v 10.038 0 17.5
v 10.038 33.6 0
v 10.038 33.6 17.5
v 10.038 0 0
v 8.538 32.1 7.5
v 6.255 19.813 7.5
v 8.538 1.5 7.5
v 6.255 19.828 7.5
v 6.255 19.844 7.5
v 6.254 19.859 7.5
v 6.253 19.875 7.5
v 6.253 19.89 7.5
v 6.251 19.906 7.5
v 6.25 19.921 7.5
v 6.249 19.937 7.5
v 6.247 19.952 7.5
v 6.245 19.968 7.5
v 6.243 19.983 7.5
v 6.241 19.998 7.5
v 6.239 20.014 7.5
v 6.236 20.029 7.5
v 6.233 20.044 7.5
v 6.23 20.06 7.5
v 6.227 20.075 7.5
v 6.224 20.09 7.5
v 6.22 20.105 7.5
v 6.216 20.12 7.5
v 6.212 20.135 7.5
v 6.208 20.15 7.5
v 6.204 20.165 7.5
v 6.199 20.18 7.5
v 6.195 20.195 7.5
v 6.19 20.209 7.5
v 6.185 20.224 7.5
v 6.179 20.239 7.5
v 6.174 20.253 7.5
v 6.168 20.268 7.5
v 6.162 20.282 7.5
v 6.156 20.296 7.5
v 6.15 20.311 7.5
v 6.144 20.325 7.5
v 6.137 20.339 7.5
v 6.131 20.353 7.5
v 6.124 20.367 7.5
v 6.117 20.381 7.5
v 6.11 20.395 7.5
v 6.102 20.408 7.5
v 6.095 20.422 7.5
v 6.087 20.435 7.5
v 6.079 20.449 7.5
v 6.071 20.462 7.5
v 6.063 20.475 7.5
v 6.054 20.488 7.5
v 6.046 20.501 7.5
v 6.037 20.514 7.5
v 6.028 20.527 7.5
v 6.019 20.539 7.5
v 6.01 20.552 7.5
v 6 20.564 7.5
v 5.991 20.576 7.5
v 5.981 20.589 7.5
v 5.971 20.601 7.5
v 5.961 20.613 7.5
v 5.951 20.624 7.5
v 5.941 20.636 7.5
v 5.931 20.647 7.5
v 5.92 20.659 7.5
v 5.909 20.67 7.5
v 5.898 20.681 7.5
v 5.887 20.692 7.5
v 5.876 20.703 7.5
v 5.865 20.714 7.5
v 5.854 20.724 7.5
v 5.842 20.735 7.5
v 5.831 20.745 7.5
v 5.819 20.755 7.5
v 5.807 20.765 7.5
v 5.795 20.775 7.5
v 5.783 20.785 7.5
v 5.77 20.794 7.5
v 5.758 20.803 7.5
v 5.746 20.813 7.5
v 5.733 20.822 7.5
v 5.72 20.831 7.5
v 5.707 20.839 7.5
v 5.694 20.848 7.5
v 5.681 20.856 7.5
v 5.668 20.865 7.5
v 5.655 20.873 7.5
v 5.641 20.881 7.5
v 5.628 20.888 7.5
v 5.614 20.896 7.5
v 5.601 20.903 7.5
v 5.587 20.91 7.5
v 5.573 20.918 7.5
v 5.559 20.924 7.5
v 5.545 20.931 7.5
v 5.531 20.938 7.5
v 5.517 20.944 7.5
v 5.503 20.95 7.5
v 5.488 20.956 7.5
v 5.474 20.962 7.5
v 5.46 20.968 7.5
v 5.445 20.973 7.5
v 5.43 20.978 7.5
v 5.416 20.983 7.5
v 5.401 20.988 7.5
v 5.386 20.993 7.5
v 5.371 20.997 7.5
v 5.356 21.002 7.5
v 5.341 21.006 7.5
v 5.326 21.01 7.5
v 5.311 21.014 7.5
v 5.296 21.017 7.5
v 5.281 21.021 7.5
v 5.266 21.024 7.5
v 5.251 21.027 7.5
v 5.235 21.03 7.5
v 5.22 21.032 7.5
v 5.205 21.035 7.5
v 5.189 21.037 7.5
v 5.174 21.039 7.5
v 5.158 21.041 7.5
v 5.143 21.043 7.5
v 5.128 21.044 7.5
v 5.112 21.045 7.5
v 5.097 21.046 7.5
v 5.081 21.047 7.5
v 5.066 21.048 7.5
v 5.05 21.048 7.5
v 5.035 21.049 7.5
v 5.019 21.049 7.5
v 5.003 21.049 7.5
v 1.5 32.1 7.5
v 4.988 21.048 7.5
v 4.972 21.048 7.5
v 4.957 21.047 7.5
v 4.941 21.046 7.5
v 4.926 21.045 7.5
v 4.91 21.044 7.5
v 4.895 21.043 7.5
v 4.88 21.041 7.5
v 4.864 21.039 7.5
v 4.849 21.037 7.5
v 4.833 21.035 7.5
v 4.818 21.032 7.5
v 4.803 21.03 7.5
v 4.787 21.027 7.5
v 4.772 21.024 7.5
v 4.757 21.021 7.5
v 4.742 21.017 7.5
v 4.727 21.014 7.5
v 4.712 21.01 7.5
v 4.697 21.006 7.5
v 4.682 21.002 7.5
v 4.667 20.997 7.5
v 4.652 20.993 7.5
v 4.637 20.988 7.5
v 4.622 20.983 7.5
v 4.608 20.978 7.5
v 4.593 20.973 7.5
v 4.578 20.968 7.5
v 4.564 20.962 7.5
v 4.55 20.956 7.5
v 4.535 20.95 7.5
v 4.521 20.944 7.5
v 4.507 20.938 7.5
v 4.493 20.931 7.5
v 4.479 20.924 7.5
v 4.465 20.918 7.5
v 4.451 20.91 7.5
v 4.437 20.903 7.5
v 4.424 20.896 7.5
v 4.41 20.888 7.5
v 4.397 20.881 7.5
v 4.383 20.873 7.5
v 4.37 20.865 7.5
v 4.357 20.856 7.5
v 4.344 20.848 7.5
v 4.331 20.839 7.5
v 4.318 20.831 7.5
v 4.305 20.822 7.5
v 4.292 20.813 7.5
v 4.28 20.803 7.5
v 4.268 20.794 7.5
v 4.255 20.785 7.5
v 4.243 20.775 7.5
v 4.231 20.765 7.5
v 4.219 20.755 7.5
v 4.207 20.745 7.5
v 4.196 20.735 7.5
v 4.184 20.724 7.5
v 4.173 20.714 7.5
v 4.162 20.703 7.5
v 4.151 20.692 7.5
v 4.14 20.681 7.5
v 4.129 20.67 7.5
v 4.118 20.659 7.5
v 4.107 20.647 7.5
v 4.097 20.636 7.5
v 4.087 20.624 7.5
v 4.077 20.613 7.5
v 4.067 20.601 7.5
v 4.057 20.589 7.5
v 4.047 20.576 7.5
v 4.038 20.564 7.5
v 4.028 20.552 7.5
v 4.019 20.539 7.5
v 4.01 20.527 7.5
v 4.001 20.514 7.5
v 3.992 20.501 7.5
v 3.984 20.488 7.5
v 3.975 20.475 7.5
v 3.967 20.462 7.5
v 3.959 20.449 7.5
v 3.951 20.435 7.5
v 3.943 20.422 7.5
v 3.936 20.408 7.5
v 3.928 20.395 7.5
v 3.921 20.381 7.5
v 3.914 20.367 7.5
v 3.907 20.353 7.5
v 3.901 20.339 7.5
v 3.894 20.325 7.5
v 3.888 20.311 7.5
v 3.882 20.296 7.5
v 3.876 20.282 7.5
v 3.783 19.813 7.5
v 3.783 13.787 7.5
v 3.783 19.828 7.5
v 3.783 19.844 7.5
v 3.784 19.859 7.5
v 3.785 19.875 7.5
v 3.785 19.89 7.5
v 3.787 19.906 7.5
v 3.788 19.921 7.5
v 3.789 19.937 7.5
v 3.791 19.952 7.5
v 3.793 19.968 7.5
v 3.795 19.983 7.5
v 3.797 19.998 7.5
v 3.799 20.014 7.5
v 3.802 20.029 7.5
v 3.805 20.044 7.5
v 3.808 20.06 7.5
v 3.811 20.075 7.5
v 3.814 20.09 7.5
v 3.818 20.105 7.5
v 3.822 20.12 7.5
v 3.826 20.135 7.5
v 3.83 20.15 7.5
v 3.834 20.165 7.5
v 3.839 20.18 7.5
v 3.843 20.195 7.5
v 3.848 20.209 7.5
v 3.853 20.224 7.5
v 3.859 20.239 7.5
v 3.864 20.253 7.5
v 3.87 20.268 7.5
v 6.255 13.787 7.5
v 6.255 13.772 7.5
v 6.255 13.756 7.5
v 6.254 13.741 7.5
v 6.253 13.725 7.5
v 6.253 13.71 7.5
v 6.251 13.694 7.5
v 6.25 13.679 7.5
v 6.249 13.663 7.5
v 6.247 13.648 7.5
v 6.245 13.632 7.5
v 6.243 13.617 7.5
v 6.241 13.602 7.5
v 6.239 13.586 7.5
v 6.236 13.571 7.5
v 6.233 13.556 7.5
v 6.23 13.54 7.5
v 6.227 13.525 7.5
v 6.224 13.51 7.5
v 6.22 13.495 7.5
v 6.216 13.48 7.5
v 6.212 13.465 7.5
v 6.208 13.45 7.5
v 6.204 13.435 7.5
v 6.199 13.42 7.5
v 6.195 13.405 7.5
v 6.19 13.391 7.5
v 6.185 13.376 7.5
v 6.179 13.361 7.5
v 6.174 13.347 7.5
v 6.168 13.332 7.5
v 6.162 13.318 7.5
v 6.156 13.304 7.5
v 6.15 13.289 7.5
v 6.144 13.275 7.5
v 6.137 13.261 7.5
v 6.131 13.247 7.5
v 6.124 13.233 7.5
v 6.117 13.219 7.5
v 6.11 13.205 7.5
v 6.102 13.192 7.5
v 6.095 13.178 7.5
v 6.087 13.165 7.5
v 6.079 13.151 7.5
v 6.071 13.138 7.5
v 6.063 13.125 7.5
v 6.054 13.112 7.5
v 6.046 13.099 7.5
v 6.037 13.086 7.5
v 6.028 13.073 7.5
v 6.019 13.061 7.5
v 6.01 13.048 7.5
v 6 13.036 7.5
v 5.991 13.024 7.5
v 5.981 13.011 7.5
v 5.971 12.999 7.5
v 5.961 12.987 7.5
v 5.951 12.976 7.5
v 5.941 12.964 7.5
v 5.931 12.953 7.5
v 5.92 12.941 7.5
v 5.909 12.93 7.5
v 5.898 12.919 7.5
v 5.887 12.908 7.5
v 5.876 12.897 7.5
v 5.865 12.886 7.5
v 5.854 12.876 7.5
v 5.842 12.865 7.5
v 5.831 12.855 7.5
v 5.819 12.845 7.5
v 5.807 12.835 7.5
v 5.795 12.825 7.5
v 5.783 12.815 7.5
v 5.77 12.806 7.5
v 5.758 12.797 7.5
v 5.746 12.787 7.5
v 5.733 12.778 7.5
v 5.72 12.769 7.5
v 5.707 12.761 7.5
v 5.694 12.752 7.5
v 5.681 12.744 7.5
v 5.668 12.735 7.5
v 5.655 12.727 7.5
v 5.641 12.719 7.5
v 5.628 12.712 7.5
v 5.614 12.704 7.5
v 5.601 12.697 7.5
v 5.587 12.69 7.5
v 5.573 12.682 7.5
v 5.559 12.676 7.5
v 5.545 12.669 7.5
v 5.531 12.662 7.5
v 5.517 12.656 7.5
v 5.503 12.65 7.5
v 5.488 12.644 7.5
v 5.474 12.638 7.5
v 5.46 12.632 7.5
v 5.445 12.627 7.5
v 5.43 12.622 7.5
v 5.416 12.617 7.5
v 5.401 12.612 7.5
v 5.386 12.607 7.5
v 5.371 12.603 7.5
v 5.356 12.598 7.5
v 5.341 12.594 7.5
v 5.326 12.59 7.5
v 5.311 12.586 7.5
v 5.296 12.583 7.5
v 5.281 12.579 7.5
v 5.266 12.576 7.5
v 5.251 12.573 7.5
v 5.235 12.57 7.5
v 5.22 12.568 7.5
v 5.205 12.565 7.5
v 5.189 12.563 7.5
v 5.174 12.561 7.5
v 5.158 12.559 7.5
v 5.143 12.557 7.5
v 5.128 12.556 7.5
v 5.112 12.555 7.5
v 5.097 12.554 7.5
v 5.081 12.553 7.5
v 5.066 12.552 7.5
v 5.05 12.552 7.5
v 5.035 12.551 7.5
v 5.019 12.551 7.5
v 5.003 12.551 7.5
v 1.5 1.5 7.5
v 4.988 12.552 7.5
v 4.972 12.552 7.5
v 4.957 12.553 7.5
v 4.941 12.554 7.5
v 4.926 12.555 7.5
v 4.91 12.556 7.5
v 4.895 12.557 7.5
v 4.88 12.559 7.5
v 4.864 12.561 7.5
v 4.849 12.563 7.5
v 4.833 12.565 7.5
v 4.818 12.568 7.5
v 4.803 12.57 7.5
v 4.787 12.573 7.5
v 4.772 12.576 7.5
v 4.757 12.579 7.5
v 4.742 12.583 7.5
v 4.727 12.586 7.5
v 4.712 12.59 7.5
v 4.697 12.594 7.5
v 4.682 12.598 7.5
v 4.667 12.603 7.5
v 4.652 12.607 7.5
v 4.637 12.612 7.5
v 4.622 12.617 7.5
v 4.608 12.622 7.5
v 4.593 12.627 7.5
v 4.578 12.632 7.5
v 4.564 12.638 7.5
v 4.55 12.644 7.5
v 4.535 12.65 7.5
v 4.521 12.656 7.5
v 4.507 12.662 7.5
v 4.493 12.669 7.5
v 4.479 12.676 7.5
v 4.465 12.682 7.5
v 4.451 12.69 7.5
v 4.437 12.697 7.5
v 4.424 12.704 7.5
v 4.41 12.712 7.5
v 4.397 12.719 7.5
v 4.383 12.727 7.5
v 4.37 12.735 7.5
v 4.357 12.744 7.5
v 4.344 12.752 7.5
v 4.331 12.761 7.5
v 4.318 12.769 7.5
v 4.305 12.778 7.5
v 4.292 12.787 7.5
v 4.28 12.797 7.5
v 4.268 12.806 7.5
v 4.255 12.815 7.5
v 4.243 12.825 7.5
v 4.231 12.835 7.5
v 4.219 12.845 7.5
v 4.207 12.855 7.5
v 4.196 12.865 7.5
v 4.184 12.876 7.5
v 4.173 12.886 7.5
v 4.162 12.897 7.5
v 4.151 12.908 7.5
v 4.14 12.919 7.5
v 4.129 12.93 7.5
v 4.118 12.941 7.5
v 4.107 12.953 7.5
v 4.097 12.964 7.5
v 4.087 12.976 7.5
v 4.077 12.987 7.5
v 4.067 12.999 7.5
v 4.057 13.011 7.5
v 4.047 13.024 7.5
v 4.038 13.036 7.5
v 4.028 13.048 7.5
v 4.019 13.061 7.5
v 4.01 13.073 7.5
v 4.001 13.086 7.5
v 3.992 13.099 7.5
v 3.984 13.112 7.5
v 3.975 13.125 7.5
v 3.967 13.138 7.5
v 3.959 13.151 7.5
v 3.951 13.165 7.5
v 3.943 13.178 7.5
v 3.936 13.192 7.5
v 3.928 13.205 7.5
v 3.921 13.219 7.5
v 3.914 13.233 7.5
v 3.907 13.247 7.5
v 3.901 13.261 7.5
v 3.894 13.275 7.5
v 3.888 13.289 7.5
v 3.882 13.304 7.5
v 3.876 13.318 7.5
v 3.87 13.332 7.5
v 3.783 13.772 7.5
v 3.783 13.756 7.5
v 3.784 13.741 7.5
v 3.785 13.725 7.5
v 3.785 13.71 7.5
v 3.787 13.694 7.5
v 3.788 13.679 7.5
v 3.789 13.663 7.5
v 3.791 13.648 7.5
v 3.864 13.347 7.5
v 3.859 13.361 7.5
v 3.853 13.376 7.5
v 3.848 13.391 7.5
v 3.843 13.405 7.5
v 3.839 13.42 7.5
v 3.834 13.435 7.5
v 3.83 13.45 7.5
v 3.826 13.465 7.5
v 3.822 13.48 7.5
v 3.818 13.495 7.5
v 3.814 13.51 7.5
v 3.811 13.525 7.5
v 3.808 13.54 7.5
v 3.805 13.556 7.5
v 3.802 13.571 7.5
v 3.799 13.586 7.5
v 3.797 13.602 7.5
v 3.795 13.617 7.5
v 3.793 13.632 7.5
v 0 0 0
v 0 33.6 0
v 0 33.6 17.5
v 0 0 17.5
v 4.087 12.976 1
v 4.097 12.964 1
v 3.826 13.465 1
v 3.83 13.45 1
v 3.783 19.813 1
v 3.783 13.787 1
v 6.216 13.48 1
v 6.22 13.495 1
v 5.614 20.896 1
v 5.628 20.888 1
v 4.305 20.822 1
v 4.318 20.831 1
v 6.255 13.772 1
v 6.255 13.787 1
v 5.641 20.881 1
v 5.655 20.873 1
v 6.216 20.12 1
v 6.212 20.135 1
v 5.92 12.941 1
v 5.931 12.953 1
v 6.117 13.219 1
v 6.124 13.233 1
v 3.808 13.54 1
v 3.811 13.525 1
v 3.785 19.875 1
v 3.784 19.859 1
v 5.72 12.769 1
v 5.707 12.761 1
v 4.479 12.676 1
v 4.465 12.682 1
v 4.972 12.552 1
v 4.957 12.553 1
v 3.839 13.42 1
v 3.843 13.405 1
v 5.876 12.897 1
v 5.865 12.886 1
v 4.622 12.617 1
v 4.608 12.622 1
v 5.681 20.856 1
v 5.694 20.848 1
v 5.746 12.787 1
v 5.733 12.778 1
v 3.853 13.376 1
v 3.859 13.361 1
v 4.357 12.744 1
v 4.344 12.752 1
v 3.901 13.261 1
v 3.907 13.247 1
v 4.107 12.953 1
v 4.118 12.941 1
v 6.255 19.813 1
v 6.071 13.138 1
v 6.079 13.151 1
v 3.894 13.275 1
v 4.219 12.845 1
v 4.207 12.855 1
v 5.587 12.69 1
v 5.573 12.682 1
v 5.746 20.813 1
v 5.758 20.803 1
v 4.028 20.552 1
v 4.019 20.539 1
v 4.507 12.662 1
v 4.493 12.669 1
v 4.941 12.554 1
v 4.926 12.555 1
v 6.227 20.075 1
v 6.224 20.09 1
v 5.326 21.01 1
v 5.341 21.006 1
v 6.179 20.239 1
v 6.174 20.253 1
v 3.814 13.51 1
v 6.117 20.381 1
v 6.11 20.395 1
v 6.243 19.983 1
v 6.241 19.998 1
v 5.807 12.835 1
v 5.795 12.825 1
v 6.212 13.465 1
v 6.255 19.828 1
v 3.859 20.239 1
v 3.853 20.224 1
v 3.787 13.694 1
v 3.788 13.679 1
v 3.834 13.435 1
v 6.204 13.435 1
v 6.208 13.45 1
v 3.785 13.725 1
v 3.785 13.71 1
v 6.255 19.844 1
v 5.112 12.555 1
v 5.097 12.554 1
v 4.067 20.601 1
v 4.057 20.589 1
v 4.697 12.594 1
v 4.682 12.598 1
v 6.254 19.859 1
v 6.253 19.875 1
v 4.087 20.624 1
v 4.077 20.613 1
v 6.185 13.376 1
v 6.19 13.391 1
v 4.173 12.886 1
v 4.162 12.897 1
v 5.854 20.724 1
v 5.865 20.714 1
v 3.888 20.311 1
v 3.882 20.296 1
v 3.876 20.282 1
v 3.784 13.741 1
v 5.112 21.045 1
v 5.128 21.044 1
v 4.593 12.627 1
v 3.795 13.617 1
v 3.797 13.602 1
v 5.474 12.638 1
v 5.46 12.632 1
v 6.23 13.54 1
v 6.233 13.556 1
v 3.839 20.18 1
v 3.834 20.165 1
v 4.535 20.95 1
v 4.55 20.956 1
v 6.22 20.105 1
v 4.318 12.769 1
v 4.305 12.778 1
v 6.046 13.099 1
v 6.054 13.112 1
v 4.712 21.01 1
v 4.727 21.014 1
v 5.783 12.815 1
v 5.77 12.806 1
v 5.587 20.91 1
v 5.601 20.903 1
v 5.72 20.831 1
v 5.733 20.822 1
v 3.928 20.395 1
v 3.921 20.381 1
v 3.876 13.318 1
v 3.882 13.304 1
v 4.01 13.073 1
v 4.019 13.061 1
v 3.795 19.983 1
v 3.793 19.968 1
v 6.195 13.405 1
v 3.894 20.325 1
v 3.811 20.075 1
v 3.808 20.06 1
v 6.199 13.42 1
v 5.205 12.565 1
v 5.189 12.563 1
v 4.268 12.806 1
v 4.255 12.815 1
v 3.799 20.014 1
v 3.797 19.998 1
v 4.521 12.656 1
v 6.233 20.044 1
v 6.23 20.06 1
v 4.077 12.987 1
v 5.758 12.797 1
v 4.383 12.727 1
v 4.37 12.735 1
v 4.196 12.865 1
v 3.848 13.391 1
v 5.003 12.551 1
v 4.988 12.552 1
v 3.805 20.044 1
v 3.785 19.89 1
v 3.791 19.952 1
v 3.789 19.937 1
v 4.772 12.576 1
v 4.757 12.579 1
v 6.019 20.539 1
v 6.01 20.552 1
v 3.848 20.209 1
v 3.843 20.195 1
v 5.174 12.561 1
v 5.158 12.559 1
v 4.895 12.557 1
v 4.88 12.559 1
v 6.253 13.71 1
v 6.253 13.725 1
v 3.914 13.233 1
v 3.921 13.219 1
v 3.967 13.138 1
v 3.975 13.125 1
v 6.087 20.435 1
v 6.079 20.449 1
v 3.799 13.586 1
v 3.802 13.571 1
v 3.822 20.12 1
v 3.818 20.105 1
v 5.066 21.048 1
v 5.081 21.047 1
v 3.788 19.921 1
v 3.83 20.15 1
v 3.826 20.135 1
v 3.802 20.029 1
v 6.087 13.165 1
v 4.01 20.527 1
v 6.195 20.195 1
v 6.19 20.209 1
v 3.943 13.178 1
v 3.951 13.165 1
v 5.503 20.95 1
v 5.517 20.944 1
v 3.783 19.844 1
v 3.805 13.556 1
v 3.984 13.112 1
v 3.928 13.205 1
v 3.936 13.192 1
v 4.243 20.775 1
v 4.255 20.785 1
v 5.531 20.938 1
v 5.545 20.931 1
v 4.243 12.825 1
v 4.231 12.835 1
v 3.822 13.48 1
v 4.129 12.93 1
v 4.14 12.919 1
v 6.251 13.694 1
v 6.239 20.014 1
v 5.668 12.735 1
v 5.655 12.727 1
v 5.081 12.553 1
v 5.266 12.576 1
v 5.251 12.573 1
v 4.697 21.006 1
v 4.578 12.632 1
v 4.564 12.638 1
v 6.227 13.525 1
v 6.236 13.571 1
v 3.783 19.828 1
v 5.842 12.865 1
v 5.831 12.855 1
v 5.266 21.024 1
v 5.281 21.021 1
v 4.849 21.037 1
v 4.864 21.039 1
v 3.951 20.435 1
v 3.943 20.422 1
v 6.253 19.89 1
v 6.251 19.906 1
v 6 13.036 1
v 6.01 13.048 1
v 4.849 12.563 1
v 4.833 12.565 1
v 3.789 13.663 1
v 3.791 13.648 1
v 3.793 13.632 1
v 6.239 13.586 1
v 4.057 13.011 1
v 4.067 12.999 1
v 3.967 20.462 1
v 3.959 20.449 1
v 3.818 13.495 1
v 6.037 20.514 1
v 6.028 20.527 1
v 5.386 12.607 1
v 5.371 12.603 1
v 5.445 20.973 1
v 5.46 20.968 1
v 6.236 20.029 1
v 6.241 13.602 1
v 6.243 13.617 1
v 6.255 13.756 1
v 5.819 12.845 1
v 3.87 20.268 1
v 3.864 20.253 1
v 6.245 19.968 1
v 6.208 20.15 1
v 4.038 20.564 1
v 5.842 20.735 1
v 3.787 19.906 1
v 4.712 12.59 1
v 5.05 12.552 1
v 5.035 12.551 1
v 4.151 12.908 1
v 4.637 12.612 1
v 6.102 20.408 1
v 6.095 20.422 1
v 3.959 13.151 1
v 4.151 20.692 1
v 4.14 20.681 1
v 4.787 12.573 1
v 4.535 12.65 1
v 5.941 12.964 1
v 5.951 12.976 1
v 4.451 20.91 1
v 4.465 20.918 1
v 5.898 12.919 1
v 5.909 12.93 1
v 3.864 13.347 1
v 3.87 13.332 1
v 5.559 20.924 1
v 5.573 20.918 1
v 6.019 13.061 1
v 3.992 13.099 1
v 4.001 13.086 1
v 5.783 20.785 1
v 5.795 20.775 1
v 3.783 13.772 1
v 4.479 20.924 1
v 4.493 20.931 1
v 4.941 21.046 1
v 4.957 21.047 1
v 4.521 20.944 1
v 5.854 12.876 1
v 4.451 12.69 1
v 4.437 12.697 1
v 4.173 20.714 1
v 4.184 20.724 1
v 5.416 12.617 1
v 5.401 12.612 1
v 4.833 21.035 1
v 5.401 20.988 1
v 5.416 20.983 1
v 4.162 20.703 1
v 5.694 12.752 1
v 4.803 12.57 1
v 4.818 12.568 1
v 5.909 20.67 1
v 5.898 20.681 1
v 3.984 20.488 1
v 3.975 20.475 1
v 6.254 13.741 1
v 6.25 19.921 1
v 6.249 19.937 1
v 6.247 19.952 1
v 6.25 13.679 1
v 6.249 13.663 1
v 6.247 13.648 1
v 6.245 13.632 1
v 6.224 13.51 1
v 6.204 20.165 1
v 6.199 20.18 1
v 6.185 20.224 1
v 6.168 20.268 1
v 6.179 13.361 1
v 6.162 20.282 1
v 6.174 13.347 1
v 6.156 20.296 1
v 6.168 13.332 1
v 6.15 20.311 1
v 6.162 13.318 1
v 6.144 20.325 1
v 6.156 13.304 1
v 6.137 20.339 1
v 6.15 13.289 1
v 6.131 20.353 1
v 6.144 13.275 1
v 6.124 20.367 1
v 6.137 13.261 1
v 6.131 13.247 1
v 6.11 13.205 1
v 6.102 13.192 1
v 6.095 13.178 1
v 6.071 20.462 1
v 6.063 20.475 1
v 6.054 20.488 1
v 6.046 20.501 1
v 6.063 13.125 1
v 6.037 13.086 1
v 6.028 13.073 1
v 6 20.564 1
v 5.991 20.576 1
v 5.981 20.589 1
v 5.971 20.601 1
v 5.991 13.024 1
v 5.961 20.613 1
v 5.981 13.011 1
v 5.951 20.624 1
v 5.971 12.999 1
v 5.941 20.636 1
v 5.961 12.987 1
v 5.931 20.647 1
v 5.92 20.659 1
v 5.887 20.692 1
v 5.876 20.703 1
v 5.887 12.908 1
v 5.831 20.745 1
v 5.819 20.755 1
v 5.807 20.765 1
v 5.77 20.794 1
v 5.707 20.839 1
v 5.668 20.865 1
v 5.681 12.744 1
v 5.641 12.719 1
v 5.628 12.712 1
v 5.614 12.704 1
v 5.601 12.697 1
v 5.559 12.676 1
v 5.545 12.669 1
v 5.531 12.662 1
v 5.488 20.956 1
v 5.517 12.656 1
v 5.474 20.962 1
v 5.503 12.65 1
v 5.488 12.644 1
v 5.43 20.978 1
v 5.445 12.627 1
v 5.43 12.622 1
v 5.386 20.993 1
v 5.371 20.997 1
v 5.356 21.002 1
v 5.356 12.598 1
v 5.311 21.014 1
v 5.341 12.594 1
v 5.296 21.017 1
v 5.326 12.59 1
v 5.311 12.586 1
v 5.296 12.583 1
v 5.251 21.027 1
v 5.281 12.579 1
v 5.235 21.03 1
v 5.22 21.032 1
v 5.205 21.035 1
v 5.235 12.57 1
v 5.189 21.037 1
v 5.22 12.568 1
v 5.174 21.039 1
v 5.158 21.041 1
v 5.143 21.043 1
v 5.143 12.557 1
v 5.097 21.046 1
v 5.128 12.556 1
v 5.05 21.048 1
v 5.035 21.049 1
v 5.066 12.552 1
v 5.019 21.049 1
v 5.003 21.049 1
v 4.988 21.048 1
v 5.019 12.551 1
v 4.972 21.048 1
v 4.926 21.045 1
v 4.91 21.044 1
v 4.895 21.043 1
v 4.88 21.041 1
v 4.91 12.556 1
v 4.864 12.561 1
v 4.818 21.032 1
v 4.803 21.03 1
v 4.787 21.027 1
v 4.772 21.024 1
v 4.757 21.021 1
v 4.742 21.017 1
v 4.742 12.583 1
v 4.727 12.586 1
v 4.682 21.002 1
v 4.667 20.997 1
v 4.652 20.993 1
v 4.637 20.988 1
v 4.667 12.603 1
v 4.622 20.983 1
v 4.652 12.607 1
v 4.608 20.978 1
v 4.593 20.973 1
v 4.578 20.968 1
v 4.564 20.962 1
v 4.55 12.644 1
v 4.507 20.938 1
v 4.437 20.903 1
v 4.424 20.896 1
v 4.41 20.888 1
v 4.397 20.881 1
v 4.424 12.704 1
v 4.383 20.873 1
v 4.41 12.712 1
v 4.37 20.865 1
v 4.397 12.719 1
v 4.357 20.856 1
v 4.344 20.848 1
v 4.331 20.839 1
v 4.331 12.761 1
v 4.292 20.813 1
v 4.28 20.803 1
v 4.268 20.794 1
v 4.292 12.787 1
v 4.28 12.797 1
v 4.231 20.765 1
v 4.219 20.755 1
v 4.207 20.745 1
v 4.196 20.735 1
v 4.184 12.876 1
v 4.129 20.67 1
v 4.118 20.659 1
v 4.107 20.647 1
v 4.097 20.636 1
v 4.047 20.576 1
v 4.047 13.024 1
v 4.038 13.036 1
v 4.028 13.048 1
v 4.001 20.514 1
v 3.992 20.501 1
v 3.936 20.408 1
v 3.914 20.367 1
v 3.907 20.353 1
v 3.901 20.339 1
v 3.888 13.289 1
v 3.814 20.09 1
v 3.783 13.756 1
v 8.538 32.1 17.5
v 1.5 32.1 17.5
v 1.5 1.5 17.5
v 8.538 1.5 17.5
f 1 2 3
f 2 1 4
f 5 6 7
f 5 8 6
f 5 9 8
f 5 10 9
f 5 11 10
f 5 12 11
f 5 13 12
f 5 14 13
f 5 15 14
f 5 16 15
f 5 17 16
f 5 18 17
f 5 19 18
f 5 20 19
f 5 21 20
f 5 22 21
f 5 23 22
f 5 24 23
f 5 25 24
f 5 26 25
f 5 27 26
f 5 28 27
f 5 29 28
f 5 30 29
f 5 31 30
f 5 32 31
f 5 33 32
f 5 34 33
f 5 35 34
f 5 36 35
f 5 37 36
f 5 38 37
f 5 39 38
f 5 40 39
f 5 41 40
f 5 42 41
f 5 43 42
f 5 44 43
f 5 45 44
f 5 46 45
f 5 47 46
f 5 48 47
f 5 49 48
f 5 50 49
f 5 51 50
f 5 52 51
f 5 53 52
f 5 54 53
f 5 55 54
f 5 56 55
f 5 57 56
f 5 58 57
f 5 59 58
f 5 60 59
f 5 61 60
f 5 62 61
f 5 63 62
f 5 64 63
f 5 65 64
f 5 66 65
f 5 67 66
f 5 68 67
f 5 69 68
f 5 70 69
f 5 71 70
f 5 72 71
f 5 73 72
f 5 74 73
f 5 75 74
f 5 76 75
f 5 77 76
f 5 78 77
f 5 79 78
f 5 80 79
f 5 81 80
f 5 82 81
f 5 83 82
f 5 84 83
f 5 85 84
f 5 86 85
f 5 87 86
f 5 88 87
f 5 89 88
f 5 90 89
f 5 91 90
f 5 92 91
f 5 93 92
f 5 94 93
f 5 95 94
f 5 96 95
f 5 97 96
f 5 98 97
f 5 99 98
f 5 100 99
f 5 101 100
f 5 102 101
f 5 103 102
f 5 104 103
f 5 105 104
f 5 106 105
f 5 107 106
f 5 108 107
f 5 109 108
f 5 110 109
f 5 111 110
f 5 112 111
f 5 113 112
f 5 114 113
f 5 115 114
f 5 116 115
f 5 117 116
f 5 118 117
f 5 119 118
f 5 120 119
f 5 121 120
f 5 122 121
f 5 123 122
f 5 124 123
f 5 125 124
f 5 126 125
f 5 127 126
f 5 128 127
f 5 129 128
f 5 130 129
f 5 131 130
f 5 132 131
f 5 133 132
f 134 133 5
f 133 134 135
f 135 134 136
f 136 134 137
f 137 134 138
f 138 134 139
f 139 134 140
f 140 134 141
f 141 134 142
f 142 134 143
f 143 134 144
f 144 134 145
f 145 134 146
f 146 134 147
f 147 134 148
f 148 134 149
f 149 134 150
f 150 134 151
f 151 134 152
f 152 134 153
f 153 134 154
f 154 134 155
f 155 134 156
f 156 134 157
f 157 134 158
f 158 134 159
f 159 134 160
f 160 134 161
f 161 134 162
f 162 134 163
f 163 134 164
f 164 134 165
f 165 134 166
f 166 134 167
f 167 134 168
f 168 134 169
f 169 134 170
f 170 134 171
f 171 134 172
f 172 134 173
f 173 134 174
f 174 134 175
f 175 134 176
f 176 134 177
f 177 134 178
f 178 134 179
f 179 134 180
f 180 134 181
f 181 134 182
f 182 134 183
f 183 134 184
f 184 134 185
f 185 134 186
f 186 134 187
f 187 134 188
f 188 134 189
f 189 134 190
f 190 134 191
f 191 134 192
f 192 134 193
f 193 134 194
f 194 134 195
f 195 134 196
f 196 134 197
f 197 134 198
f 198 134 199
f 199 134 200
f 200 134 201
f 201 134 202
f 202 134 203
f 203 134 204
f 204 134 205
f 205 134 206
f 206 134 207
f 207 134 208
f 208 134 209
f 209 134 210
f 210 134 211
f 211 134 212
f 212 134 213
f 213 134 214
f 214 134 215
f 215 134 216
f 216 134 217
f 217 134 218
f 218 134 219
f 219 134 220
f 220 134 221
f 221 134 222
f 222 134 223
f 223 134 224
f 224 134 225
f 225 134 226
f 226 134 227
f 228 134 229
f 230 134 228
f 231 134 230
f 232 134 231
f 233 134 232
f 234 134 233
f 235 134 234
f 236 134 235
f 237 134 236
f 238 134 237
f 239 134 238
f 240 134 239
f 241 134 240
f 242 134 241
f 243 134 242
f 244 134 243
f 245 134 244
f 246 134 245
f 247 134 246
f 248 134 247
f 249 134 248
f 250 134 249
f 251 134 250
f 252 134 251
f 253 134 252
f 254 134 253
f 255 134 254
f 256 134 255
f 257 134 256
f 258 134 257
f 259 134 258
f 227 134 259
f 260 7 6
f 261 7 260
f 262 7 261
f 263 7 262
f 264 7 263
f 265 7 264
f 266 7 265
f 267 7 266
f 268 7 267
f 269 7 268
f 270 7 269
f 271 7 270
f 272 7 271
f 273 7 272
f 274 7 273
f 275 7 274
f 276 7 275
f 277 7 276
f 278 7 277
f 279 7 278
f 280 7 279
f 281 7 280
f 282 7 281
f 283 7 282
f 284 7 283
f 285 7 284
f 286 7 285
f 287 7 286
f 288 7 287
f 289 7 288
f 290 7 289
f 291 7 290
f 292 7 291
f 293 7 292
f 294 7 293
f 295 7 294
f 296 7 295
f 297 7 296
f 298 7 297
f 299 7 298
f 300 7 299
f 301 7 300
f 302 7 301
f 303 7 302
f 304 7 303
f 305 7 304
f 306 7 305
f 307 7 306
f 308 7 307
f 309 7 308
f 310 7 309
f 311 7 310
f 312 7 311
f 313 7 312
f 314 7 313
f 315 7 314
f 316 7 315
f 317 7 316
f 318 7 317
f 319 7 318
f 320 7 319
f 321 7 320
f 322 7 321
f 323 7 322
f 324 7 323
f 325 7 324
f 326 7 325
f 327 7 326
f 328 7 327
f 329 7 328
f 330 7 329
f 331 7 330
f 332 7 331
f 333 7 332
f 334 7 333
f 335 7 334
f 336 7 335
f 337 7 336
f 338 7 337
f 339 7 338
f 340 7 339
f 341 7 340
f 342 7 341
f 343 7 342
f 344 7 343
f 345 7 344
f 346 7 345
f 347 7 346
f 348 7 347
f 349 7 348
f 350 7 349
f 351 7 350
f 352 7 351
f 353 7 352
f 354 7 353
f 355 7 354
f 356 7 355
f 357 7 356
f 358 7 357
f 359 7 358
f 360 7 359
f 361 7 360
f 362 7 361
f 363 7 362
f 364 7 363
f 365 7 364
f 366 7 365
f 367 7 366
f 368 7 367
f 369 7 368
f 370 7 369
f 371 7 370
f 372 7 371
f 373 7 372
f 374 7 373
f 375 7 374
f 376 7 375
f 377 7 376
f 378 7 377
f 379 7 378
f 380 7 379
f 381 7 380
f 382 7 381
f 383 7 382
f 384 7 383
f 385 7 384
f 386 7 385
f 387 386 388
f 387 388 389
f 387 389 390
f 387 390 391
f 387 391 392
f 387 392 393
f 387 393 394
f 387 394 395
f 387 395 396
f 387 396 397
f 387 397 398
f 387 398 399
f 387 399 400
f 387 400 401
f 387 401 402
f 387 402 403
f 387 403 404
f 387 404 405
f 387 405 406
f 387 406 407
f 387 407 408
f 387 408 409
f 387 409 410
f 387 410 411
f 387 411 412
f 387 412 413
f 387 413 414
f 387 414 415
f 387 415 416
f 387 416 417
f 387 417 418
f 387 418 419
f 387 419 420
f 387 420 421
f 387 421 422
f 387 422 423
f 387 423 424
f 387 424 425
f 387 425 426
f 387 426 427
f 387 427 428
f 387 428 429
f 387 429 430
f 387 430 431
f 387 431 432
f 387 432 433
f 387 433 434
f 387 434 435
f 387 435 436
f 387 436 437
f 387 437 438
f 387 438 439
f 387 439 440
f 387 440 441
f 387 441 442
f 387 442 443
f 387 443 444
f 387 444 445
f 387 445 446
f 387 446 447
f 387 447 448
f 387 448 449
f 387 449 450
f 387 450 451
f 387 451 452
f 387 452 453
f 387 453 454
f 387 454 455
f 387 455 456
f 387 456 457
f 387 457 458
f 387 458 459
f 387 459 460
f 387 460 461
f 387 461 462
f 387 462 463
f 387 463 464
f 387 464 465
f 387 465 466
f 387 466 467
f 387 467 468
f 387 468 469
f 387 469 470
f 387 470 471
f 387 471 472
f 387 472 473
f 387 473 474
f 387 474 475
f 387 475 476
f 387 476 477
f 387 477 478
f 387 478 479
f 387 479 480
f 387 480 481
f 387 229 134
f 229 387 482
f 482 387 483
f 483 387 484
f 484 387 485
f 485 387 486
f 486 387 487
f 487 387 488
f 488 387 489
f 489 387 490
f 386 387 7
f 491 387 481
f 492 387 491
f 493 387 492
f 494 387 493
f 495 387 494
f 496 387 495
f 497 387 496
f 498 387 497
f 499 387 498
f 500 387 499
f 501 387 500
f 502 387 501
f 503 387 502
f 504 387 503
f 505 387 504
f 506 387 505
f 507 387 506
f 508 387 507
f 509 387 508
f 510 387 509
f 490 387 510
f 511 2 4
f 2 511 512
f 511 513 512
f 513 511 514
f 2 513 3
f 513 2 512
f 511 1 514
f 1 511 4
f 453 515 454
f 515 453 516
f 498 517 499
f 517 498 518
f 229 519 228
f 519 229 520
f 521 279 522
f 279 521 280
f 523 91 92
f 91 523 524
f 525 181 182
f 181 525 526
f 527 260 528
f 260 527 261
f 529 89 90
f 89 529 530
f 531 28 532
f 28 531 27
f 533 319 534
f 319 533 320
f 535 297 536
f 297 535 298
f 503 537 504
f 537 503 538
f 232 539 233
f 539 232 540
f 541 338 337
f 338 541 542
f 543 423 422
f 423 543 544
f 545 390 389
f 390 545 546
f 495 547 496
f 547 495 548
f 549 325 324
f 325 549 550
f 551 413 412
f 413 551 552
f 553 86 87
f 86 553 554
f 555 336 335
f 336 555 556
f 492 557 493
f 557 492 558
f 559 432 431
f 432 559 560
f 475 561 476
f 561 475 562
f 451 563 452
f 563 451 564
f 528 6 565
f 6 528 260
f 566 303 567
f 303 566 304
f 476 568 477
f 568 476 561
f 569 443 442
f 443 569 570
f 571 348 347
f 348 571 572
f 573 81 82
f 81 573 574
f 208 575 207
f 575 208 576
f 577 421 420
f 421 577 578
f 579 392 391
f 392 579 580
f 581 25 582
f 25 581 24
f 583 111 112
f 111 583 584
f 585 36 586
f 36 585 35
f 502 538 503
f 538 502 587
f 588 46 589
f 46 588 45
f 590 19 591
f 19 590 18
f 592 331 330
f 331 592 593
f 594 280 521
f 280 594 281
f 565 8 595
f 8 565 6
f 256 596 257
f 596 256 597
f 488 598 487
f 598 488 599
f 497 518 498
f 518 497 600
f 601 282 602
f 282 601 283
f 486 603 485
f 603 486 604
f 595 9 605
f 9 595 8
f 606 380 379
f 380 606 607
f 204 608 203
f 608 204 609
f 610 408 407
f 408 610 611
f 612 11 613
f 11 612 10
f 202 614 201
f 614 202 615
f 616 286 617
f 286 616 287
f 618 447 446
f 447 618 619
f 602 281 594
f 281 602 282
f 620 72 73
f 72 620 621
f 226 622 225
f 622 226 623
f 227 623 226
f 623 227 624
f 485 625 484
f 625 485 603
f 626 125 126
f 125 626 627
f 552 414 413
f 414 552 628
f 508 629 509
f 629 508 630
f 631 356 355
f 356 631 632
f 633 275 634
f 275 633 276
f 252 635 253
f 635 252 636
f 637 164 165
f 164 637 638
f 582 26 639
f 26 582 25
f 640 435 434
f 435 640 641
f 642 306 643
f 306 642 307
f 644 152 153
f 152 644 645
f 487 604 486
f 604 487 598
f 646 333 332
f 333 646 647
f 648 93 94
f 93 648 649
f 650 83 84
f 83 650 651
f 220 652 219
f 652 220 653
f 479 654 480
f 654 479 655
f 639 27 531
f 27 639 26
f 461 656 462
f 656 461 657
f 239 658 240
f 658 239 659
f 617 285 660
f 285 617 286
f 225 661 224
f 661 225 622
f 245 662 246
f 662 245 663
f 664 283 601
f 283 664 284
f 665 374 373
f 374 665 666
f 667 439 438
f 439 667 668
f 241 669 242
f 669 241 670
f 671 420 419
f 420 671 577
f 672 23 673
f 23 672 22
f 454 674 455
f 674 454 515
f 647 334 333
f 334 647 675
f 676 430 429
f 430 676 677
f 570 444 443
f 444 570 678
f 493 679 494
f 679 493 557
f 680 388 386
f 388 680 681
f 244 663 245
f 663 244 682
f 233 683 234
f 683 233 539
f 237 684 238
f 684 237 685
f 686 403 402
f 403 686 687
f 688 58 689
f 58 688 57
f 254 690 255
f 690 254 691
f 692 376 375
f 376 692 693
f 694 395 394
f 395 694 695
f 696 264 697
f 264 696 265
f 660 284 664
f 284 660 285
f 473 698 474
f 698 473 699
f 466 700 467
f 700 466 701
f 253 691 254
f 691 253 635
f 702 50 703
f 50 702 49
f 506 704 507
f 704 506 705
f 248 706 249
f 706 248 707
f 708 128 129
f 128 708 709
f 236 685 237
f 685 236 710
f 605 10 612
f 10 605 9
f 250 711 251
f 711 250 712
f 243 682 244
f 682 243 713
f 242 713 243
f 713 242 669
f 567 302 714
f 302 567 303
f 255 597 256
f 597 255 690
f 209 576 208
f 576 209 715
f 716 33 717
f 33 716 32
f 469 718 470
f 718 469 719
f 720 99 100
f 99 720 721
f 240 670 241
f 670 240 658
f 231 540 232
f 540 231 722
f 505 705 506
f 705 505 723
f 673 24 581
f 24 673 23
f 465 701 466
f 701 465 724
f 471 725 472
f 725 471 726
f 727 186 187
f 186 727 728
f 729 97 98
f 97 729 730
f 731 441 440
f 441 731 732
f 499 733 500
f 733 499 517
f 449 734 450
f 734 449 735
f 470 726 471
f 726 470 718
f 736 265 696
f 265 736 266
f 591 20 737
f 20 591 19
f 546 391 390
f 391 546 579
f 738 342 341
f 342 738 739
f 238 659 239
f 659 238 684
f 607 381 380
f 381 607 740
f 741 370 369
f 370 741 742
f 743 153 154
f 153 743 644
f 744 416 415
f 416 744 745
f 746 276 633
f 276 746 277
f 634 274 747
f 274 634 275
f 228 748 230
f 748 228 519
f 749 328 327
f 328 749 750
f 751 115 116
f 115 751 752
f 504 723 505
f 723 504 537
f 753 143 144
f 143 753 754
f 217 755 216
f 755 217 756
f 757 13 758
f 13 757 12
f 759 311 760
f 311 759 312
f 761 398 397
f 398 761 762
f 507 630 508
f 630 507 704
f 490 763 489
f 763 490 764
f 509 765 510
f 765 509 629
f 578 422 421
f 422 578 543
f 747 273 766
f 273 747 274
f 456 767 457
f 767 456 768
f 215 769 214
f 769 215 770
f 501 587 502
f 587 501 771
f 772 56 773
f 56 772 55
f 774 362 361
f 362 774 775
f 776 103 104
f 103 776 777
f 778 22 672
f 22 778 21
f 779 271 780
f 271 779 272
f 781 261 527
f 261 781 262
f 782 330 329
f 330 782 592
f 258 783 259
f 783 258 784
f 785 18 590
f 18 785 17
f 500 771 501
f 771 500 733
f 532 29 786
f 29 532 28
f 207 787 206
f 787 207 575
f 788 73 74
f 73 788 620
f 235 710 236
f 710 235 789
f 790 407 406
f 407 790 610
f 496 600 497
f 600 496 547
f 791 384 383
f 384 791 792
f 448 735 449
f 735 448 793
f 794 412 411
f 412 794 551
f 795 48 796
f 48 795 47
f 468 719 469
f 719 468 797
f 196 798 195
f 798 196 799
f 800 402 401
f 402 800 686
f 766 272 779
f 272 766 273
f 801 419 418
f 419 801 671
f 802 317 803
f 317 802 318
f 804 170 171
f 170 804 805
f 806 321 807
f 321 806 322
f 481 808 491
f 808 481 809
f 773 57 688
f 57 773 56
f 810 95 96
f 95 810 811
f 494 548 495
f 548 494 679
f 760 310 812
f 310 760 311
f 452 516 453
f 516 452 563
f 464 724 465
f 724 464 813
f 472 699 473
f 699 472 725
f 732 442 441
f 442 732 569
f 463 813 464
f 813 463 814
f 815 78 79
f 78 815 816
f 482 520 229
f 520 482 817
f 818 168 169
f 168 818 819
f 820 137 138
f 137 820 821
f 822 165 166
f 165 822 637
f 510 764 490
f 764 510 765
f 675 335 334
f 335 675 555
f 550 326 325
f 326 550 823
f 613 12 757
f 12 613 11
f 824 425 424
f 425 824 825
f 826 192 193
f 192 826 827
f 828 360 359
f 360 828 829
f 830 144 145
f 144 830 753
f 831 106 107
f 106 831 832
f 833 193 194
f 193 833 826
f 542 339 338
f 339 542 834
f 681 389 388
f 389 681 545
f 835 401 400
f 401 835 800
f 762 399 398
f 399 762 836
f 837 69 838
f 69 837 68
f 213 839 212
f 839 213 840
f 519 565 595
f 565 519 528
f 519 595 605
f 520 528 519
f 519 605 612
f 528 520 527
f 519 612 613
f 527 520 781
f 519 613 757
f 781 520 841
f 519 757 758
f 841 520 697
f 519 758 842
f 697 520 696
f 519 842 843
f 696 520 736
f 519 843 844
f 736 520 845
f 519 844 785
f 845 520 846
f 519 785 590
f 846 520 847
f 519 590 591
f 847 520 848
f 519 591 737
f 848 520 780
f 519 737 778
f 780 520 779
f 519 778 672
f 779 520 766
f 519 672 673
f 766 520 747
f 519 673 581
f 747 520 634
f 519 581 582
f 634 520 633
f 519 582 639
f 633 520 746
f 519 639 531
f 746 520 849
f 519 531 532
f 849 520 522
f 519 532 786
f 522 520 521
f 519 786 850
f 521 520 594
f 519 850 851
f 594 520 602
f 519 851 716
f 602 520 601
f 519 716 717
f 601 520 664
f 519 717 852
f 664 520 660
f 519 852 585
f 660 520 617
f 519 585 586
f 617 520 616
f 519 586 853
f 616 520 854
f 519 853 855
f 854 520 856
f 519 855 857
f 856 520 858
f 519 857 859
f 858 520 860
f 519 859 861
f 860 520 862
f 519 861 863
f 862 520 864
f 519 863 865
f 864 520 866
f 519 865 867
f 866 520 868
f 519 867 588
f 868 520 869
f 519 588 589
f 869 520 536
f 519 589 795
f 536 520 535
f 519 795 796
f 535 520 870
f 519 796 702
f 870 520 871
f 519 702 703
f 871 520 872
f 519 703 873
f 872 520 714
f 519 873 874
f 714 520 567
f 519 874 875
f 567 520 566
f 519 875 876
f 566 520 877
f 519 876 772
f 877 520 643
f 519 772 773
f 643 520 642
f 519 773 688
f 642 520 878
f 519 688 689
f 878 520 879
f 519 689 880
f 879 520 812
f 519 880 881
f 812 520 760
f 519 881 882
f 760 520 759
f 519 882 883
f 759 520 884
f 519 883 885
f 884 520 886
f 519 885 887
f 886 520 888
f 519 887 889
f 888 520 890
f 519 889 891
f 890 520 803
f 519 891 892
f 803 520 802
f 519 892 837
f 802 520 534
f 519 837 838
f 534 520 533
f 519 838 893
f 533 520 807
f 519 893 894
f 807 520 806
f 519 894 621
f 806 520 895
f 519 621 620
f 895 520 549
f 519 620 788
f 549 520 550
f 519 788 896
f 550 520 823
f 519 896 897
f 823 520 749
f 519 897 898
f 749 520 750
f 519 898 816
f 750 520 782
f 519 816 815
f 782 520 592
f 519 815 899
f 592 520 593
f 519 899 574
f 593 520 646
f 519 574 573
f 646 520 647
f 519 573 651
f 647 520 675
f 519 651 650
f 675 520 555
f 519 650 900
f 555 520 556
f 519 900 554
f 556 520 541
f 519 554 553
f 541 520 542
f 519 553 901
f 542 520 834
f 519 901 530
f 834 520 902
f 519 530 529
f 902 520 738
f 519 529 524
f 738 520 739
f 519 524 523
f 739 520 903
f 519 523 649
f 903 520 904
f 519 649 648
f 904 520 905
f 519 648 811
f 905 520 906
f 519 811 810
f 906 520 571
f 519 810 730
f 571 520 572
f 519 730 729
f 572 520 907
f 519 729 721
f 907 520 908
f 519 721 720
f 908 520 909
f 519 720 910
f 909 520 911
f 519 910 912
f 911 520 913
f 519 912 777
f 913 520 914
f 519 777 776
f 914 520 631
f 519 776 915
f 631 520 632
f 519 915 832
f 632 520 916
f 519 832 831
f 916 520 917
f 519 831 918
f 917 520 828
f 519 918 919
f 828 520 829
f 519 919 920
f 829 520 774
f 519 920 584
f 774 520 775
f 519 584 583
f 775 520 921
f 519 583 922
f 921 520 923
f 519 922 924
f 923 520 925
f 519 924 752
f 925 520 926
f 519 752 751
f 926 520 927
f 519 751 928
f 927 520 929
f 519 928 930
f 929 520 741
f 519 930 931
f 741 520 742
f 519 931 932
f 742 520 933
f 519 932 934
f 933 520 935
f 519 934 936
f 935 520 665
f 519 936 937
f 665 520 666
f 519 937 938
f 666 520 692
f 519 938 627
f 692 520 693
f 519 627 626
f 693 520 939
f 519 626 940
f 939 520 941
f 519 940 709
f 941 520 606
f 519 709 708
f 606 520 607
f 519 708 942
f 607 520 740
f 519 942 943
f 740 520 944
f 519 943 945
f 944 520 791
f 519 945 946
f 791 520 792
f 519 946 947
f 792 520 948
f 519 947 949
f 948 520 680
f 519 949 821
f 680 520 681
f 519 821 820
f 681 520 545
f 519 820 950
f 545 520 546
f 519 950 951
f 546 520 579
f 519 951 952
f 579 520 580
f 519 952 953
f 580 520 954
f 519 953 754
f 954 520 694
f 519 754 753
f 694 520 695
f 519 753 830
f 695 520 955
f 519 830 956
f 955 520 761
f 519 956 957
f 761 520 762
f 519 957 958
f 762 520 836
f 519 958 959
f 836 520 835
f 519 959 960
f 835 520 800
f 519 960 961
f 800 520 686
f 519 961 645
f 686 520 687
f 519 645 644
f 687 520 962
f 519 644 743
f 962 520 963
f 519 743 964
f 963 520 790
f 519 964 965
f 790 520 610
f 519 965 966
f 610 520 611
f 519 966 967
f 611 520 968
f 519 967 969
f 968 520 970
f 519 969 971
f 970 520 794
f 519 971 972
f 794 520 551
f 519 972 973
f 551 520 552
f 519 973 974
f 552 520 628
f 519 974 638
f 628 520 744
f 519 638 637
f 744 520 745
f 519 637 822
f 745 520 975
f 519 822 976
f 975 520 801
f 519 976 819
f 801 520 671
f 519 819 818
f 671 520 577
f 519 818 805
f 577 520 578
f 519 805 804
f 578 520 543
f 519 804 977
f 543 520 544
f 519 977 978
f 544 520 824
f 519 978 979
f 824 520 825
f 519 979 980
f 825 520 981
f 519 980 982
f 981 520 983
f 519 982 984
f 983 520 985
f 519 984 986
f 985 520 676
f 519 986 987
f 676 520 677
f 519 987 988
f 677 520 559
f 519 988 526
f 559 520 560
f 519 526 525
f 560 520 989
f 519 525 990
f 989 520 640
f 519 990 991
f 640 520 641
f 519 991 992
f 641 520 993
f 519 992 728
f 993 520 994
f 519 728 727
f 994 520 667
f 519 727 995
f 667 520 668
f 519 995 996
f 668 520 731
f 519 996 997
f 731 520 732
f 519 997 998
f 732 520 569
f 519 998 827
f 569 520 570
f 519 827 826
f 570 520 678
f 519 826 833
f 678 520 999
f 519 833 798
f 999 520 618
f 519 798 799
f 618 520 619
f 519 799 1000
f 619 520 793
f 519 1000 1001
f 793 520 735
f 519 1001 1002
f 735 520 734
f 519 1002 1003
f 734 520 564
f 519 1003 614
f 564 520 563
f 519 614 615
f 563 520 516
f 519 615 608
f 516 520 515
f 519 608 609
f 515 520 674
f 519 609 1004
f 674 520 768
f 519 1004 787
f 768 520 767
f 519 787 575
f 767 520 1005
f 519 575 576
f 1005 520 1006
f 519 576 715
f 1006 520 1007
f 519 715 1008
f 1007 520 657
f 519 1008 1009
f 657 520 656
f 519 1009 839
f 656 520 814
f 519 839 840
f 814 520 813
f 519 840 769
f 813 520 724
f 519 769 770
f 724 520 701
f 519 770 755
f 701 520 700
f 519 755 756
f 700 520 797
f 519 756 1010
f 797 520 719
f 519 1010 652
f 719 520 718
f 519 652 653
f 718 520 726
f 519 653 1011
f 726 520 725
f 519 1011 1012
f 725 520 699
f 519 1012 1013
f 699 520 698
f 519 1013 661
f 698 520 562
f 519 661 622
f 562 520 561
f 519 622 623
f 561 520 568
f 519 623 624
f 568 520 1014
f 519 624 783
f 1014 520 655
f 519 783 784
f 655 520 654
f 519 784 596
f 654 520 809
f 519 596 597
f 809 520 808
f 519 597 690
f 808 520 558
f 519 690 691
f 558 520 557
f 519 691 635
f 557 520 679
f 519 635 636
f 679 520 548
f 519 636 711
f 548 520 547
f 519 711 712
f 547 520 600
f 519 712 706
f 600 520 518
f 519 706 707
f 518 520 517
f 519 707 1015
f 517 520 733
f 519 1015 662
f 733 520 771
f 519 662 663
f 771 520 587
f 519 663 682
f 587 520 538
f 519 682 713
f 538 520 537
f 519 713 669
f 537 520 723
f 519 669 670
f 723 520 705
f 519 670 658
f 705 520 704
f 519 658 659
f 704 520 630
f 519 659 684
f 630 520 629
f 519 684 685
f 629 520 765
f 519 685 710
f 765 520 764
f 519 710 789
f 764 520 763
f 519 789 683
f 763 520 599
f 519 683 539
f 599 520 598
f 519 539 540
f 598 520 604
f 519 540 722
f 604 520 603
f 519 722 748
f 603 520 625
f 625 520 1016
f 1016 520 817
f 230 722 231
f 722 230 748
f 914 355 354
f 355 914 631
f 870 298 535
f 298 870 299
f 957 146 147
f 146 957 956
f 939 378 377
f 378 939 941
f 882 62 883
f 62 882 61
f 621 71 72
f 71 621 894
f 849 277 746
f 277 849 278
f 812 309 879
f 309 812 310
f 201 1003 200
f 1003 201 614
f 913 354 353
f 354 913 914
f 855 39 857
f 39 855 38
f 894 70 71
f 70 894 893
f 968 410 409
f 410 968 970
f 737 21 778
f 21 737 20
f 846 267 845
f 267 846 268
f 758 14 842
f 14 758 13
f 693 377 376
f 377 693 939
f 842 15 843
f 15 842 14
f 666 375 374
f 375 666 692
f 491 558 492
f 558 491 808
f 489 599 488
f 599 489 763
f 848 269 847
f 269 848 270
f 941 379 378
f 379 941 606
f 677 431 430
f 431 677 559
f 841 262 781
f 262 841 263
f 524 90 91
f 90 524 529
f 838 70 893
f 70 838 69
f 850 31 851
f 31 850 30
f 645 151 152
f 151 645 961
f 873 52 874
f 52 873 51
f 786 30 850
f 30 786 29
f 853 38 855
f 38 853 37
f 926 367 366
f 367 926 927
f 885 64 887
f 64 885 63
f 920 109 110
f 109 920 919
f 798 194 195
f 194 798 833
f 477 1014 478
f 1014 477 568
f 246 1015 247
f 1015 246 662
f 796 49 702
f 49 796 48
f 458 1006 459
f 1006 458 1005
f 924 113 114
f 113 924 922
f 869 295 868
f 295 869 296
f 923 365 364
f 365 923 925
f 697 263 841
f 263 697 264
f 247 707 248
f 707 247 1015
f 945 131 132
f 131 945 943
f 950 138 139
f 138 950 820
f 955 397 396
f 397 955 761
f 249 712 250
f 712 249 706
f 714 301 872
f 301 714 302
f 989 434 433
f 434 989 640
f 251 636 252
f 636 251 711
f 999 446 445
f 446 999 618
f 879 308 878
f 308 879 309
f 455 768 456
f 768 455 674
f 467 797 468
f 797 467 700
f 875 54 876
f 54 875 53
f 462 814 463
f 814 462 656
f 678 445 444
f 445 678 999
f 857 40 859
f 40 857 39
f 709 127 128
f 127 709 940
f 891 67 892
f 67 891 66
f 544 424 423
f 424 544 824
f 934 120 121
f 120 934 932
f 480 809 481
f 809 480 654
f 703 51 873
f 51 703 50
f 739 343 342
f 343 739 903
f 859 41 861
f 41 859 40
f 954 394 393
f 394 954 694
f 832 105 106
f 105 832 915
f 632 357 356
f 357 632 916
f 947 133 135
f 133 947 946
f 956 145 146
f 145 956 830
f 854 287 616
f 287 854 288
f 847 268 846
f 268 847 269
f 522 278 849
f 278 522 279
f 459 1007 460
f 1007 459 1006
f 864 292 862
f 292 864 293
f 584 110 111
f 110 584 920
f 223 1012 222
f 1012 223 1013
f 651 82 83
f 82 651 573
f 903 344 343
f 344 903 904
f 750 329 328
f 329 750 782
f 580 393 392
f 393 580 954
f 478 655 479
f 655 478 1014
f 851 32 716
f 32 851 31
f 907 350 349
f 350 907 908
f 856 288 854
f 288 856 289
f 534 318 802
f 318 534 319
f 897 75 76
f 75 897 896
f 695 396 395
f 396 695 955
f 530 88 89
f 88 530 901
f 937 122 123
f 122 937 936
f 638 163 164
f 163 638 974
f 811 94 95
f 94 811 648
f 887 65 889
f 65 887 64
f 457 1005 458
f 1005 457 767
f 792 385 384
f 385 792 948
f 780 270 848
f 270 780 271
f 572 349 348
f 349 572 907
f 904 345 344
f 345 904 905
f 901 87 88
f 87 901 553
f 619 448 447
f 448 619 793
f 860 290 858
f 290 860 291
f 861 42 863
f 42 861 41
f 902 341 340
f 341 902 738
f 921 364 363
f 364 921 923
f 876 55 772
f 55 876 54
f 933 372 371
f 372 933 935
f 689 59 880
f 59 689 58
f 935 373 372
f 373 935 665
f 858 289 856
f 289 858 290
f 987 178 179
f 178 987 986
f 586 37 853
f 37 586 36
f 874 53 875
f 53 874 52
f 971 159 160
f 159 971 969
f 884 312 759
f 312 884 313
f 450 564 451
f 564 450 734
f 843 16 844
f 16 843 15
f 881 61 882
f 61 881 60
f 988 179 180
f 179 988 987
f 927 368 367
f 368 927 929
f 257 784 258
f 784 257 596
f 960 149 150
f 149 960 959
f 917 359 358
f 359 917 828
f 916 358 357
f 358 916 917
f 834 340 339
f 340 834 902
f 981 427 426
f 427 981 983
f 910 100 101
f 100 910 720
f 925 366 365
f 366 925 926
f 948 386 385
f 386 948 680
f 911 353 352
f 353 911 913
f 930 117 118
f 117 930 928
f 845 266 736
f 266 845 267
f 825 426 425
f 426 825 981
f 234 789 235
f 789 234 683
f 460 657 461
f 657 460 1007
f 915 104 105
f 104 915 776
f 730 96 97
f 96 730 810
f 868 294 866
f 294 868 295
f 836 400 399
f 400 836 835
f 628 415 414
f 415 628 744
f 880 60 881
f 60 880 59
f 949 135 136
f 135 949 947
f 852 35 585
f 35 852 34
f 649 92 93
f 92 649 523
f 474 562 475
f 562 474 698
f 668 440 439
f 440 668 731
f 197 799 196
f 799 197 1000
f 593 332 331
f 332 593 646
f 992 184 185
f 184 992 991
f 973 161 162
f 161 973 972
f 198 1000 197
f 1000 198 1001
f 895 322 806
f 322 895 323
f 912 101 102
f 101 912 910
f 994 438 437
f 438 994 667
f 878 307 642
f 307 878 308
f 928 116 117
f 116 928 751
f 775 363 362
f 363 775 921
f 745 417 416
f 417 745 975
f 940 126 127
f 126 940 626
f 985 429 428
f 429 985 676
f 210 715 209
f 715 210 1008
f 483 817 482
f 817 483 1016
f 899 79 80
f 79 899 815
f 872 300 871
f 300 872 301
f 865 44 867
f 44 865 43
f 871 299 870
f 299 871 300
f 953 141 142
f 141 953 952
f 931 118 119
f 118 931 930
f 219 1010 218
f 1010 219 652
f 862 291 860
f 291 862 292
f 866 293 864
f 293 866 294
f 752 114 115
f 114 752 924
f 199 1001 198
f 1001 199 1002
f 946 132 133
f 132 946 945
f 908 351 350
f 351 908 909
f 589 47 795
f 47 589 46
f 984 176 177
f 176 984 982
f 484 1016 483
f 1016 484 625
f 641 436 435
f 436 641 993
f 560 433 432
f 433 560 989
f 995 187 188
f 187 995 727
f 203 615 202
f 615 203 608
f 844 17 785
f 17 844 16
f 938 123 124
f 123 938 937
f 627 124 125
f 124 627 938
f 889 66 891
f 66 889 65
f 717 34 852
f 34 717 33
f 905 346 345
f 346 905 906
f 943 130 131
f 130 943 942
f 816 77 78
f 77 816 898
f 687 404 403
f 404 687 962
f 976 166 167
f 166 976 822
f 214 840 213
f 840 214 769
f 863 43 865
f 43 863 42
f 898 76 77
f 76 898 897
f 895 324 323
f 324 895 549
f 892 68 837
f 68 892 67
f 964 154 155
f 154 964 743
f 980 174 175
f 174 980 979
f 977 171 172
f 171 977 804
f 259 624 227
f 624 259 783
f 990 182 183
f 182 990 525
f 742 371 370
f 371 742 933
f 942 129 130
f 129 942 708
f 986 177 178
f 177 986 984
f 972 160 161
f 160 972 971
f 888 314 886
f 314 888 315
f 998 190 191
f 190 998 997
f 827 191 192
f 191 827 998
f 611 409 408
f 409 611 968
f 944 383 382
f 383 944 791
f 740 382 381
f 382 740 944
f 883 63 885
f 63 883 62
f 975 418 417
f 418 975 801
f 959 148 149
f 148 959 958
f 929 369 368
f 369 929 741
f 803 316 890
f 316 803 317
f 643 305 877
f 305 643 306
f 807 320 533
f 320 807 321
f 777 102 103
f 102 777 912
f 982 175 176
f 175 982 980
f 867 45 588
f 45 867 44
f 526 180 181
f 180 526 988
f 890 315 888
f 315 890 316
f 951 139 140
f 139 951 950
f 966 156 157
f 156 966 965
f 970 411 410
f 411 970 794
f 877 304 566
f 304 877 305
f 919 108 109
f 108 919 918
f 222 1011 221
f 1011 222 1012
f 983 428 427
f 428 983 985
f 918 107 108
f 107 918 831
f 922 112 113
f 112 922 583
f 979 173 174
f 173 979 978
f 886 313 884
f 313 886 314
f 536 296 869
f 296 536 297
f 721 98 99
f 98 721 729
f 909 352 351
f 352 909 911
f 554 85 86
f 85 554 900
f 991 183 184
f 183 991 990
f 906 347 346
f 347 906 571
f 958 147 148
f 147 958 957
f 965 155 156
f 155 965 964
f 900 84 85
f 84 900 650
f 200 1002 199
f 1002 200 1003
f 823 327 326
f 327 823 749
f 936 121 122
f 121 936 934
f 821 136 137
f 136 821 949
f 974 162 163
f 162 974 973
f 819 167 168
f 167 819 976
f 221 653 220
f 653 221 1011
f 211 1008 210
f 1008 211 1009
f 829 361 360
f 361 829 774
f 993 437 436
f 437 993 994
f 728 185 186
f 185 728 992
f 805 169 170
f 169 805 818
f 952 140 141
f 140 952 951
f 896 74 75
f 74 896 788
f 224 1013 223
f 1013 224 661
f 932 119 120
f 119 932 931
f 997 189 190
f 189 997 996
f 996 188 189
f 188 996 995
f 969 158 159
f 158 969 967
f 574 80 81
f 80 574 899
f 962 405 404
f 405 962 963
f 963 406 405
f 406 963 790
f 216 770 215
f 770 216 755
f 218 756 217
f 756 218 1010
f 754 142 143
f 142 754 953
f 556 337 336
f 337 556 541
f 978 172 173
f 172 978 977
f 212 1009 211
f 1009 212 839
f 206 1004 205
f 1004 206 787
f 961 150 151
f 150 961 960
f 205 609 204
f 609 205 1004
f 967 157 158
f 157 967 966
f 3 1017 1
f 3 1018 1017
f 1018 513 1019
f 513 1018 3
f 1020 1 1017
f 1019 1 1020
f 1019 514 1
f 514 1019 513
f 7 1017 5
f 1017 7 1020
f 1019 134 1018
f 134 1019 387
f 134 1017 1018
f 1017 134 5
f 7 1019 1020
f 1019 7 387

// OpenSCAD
$fn = 500;
wall_thickness = 1.5;

// To render the base only:
// depth = 0;
// For full-size depth:
// depth = 32;
// Mini version:
depth = 10;
padding = 1.02;
height = 6.9 * padding;
width = 30 * padding;

// For no base, set this to value smaller than USB-C plug depth:
base_depth = 7.5;

plug_padding = 1.03;
usb_c_plug_width = 8.25 * plug_padding;
usb_c_plug_height = 2.4 * plug_padding;
usb_c_plug_depth = 6.5;

slots = 1;

module usb_c_plug () {
  hull () {
    cylinder (usb_c_plug_depth, usb_c_plug_height / 2, usb_c_plug_height / 2);
    translate([0, usb_c_plug_width - usb_c_plug_height, 0])
      cylinder (usb_c_plug_depth, usb_c_plug_height / 2, usb_c_plug_height / 2);
  }
}

module slot_base () {
  difference () {
    cube([height + wall_thickness * 2, width + wall_thickness * 2, base_depth]);
    translate([wall_thickness + (height / 2), wall_thickness + ((width - usb_c_plug_width + usb_c_plug_height) / 2), base_depth - usb_c_plug_depth])
      usb_c_plug();
  }
}

module slot () {
  slot_base();
  translate([0, 0, base_depth])
    difference () {
      cube([height + wall_thickness * 2, width + wall_thickness * 2, depth]);
      translate([wall_thickness, wall_thickness])
        cube([height, width, depth]);
    };
}

for (i = [0 : slots - 1]) {
  translate([(height + wall_thickness) * i, 0, 0])
    slot();
}
